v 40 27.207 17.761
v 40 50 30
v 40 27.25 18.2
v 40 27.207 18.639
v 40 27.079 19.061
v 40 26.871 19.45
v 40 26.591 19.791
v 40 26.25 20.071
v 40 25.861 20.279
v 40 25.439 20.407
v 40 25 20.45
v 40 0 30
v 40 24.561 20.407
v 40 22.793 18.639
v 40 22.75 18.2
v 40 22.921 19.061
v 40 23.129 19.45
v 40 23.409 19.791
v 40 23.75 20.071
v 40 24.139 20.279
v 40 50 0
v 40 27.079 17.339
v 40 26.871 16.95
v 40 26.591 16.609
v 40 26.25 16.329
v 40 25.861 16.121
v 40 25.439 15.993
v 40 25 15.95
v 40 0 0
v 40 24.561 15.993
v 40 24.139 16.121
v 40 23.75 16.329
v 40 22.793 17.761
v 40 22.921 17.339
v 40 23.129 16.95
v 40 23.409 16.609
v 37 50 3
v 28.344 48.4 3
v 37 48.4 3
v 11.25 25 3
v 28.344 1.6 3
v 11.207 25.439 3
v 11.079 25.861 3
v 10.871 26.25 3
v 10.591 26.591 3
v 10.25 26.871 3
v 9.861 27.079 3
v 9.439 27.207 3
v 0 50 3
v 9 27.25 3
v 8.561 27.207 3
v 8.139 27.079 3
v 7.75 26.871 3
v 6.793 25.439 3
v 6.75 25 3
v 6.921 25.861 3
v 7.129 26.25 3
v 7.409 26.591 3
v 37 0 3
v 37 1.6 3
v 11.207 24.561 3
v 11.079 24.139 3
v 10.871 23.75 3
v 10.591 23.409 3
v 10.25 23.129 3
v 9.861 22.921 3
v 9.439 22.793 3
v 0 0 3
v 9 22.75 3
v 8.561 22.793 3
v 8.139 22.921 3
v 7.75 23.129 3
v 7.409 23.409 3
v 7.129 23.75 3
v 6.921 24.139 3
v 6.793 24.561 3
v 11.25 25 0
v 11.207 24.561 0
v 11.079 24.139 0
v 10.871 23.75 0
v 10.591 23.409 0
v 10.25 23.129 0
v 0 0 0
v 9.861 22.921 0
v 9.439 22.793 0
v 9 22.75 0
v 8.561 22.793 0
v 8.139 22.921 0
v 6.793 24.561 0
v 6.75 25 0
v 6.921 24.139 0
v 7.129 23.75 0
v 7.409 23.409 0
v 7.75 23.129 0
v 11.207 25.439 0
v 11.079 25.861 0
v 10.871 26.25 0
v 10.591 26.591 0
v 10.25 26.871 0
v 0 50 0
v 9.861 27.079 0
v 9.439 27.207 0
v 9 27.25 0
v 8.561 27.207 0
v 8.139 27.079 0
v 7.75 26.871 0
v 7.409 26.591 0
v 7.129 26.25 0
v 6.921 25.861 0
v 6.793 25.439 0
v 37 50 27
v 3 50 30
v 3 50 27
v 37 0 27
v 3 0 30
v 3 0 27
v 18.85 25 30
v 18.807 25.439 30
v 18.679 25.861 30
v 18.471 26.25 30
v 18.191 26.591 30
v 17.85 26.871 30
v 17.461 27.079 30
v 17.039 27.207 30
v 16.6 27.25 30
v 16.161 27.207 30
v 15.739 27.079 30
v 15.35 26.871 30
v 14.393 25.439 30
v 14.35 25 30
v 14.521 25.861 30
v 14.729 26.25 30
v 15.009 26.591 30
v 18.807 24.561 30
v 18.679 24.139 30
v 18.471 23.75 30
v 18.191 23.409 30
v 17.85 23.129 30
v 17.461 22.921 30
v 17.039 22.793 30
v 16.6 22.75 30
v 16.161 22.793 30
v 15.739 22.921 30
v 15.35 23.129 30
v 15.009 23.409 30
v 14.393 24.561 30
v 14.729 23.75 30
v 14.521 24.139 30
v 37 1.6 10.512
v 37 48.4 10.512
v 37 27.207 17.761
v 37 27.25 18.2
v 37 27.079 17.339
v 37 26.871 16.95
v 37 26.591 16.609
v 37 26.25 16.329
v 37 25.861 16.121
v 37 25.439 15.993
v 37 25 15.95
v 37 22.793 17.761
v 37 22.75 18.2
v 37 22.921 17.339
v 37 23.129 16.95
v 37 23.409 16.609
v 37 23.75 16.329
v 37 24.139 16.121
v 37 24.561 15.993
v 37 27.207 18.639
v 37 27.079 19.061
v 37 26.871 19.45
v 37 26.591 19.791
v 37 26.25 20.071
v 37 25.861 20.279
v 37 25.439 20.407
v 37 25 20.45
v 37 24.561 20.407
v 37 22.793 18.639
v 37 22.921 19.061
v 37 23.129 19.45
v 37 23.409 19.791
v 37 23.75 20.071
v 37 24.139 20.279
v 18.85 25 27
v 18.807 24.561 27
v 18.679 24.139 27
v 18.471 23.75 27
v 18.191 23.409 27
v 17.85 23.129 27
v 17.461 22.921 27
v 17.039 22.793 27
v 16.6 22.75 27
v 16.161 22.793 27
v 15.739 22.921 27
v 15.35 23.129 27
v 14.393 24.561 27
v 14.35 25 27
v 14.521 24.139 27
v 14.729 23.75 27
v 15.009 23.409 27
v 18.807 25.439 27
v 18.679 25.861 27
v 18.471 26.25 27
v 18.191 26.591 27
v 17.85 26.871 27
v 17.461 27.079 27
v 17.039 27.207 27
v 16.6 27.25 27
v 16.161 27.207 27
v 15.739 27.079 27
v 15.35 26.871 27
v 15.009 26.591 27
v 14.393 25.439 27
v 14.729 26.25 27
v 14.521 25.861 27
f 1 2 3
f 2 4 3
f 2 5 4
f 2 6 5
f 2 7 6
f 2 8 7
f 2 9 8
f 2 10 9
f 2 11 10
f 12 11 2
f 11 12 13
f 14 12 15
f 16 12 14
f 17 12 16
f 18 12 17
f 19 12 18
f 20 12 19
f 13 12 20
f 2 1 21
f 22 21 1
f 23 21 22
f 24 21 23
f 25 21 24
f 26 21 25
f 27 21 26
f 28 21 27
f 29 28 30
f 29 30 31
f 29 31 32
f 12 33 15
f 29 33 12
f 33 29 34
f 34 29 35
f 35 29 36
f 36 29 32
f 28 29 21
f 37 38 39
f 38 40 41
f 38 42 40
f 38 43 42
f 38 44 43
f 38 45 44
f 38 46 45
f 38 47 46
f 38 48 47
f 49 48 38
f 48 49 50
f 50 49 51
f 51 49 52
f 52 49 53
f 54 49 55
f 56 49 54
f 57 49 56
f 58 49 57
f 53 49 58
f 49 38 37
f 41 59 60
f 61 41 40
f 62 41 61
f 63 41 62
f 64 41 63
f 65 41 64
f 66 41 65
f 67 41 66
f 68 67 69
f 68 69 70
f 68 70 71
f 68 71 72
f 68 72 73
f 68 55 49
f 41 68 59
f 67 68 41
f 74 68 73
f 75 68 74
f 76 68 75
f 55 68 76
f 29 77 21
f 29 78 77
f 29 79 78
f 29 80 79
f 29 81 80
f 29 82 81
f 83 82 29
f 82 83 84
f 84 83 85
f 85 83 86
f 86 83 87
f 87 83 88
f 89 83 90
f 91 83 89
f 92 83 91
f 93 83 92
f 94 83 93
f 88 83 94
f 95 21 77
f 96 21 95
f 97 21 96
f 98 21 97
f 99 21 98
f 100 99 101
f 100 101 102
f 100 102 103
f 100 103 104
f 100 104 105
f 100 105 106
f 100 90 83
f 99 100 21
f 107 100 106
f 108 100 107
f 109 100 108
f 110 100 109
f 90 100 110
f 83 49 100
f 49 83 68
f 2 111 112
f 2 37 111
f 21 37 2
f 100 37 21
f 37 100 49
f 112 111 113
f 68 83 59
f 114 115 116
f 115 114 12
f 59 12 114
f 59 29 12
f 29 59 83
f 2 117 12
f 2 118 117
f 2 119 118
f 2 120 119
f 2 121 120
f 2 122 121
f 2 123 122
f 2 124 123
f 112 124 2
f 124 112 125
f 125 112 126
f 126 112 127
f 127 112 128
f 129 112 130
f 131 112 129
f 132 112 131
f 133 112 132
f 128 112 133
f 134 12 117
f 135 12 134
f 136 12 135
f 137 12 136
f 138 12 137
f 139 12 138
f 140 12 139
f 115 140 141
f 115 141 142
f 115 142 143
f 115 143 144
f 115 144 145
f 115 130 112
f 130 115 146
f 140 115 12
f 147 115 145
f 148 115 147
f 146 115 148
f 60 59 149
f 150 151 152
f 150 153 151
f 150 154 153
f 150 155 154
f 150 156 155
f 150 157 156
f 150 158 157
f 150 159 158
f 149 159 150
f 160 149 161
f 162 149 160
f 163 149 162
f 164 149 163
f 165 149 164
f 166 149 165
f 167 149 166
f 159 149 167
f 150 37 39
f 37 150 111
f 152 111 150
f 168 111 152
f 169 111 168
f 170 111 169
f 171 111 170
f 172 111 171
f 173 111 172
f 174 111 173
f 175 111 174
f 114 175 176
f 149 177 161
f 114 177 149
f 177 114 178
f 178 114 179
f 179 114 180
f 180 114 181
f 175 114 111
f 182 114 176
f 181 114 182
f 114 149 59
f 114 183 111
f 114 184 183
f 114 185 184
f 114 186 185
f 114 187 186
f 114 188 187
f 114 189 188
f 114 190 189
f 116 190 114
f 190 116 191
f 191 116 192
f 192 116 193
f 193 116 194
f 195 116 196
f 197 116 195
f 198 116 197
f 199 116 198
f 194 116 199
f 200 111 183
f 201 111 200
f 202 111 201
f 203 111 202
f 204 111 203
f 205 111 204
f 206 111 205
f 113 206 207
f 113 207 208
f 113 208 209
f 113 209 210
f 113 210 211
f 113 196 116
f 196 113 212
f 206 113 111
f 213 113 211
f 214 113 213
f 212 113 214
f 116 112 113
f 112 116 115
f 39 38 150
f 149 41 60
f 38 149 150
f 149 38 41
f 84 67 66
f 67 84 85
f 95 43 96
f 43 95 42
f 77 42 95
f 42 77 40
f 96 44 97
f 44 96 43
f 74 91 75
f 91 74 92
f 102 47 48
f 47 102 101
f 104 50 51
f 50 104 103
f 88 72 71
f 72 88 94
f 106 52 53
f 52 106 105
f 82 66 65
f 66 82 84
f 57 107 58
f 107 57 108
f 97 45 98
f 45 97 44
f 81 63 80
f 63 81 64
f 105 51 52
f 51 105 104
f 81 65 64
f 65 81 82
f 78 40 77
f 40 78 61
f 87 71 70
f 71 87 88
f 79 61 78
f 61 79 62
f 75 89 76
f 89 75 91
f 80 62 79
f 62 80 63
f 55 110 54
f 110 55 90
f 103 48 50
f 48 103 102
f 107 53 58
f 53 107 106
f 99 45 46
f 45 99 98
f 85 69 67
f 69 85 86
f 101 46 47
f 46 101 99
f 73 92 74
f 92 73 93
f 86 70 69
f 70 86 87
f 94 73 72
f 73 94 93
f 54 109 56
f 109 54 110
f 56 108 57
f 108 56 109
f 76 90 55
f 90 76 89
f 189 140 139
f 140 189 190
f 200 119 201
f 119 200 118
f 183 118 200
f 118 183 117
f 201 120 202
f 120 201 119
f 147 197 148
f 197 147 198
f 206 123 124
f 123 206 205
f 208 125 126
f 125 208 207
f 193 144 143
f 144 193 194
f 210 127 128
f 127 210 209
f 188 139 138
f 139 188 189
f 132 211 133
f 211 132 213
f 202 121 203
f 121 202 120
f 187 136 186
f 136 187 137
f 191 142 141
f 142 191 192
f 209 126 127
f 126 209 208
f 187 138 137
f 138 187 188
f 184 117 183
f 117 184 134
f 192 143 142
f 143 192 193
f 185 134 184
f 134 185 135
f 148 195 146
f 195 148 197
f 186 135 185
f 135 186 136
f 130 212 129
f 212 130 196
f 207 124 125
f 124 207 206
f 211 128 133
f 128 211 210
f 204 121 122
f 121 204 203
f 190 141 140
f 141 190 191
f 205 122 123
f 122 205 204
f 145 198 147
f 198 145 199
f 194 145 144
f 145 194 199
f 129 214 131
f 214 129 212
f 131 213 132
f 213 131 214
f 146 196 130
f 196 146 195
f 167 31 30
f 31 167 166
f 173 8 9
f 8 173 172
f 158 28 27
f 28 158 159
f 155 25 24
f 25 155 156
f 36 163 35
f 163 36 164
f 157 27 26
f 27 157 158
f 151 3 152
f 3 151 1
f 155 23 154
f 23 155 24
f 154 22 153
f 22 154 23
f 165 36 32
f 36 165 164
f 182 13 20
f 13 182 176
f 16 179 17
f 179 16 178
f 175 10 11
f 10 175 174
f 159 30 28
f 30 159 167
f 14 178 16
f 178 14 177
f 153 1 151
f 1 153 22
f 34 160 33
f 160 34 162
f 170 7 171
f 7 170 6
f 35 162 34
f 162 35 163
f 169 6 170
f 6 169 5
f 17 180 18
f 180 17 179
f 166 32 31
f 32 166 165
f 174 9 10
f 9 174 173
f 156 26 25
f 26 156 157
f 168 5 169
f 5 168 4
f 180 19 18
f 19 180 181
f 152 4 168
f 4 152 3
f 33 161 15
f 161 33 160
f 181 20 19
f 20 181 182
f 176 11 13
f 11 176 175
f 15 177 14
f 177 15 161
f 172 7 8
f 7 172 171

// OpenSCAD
$fn = 32;

// ----------------------------------------------------------------------
// Z-bracket: 40 x 50 x 30 mm
// ----------------------------------------------------------------------

// --- parameters (mm) ---
lower_leg = 40;           // lower foot length, X
upper_leg = 34;           // upper foot length, X
bracket_w = 50;           // bracket width, Y
offset_h = 30;            // overall rise, Z
sheet_t = 3;              // plate thickness
hole_d = 4.5;             // clearance for M4
rib_len = 10.5;           // gusset leg
rib_sink = 1.6;           // gusset overlap into the plates

module hole_z(px, py, z0) {
  translate([px, py, z0 - 2.5]) cylinder(h = sheet_t + 5, d = hole_d);
}
module hole_x(py, pz) {
  translate([-2.5, py, pz]) rotate([0, 90, 0]) cylinder(h = sheet_t + 5, d = hole_d);
}
module gusset(x0) {
  translate([x0, bracket_w - rib_sink, 0])
    rotate([90, 0, 0])
      linear_extrude(height = bracket_w - 2 * rib_sink)
        polygon(points = [[rib_sink, sheet_t - rib_sink],
                          [rib_sink, sheet_t - rib_sink + rib_len],
                          [-rib_len, sheet_t - rib_sink]]);
}

difference() {
  union() {
    cube([lower_leg, bracket_w, sheet_t]);
    /* web, overlapping the lower foot */
    translate([lower_leg - sheet_t, 0, 0]) cube([sheet_t, bracket_w, offset_h]);
    /* upper foot, sunk into the web */
    translate([lower_leg - sheet_t - upper_leg, 0, offset_h - sheet_t]) cube([upper_leg + sheet_t, bracket_w, sheet_t]);
    gusset(lower_leg - sheet_t);
  }
  hole_z(9, 25, 0);
  translate([lower_leg - sheet_t - 20.4, 0, 0]) hole_z(0, 25, offset_h - sheet_t);
  translate([lower_leg - sheet_t, 0, 0]) hole_x(25, 18.2);
}
